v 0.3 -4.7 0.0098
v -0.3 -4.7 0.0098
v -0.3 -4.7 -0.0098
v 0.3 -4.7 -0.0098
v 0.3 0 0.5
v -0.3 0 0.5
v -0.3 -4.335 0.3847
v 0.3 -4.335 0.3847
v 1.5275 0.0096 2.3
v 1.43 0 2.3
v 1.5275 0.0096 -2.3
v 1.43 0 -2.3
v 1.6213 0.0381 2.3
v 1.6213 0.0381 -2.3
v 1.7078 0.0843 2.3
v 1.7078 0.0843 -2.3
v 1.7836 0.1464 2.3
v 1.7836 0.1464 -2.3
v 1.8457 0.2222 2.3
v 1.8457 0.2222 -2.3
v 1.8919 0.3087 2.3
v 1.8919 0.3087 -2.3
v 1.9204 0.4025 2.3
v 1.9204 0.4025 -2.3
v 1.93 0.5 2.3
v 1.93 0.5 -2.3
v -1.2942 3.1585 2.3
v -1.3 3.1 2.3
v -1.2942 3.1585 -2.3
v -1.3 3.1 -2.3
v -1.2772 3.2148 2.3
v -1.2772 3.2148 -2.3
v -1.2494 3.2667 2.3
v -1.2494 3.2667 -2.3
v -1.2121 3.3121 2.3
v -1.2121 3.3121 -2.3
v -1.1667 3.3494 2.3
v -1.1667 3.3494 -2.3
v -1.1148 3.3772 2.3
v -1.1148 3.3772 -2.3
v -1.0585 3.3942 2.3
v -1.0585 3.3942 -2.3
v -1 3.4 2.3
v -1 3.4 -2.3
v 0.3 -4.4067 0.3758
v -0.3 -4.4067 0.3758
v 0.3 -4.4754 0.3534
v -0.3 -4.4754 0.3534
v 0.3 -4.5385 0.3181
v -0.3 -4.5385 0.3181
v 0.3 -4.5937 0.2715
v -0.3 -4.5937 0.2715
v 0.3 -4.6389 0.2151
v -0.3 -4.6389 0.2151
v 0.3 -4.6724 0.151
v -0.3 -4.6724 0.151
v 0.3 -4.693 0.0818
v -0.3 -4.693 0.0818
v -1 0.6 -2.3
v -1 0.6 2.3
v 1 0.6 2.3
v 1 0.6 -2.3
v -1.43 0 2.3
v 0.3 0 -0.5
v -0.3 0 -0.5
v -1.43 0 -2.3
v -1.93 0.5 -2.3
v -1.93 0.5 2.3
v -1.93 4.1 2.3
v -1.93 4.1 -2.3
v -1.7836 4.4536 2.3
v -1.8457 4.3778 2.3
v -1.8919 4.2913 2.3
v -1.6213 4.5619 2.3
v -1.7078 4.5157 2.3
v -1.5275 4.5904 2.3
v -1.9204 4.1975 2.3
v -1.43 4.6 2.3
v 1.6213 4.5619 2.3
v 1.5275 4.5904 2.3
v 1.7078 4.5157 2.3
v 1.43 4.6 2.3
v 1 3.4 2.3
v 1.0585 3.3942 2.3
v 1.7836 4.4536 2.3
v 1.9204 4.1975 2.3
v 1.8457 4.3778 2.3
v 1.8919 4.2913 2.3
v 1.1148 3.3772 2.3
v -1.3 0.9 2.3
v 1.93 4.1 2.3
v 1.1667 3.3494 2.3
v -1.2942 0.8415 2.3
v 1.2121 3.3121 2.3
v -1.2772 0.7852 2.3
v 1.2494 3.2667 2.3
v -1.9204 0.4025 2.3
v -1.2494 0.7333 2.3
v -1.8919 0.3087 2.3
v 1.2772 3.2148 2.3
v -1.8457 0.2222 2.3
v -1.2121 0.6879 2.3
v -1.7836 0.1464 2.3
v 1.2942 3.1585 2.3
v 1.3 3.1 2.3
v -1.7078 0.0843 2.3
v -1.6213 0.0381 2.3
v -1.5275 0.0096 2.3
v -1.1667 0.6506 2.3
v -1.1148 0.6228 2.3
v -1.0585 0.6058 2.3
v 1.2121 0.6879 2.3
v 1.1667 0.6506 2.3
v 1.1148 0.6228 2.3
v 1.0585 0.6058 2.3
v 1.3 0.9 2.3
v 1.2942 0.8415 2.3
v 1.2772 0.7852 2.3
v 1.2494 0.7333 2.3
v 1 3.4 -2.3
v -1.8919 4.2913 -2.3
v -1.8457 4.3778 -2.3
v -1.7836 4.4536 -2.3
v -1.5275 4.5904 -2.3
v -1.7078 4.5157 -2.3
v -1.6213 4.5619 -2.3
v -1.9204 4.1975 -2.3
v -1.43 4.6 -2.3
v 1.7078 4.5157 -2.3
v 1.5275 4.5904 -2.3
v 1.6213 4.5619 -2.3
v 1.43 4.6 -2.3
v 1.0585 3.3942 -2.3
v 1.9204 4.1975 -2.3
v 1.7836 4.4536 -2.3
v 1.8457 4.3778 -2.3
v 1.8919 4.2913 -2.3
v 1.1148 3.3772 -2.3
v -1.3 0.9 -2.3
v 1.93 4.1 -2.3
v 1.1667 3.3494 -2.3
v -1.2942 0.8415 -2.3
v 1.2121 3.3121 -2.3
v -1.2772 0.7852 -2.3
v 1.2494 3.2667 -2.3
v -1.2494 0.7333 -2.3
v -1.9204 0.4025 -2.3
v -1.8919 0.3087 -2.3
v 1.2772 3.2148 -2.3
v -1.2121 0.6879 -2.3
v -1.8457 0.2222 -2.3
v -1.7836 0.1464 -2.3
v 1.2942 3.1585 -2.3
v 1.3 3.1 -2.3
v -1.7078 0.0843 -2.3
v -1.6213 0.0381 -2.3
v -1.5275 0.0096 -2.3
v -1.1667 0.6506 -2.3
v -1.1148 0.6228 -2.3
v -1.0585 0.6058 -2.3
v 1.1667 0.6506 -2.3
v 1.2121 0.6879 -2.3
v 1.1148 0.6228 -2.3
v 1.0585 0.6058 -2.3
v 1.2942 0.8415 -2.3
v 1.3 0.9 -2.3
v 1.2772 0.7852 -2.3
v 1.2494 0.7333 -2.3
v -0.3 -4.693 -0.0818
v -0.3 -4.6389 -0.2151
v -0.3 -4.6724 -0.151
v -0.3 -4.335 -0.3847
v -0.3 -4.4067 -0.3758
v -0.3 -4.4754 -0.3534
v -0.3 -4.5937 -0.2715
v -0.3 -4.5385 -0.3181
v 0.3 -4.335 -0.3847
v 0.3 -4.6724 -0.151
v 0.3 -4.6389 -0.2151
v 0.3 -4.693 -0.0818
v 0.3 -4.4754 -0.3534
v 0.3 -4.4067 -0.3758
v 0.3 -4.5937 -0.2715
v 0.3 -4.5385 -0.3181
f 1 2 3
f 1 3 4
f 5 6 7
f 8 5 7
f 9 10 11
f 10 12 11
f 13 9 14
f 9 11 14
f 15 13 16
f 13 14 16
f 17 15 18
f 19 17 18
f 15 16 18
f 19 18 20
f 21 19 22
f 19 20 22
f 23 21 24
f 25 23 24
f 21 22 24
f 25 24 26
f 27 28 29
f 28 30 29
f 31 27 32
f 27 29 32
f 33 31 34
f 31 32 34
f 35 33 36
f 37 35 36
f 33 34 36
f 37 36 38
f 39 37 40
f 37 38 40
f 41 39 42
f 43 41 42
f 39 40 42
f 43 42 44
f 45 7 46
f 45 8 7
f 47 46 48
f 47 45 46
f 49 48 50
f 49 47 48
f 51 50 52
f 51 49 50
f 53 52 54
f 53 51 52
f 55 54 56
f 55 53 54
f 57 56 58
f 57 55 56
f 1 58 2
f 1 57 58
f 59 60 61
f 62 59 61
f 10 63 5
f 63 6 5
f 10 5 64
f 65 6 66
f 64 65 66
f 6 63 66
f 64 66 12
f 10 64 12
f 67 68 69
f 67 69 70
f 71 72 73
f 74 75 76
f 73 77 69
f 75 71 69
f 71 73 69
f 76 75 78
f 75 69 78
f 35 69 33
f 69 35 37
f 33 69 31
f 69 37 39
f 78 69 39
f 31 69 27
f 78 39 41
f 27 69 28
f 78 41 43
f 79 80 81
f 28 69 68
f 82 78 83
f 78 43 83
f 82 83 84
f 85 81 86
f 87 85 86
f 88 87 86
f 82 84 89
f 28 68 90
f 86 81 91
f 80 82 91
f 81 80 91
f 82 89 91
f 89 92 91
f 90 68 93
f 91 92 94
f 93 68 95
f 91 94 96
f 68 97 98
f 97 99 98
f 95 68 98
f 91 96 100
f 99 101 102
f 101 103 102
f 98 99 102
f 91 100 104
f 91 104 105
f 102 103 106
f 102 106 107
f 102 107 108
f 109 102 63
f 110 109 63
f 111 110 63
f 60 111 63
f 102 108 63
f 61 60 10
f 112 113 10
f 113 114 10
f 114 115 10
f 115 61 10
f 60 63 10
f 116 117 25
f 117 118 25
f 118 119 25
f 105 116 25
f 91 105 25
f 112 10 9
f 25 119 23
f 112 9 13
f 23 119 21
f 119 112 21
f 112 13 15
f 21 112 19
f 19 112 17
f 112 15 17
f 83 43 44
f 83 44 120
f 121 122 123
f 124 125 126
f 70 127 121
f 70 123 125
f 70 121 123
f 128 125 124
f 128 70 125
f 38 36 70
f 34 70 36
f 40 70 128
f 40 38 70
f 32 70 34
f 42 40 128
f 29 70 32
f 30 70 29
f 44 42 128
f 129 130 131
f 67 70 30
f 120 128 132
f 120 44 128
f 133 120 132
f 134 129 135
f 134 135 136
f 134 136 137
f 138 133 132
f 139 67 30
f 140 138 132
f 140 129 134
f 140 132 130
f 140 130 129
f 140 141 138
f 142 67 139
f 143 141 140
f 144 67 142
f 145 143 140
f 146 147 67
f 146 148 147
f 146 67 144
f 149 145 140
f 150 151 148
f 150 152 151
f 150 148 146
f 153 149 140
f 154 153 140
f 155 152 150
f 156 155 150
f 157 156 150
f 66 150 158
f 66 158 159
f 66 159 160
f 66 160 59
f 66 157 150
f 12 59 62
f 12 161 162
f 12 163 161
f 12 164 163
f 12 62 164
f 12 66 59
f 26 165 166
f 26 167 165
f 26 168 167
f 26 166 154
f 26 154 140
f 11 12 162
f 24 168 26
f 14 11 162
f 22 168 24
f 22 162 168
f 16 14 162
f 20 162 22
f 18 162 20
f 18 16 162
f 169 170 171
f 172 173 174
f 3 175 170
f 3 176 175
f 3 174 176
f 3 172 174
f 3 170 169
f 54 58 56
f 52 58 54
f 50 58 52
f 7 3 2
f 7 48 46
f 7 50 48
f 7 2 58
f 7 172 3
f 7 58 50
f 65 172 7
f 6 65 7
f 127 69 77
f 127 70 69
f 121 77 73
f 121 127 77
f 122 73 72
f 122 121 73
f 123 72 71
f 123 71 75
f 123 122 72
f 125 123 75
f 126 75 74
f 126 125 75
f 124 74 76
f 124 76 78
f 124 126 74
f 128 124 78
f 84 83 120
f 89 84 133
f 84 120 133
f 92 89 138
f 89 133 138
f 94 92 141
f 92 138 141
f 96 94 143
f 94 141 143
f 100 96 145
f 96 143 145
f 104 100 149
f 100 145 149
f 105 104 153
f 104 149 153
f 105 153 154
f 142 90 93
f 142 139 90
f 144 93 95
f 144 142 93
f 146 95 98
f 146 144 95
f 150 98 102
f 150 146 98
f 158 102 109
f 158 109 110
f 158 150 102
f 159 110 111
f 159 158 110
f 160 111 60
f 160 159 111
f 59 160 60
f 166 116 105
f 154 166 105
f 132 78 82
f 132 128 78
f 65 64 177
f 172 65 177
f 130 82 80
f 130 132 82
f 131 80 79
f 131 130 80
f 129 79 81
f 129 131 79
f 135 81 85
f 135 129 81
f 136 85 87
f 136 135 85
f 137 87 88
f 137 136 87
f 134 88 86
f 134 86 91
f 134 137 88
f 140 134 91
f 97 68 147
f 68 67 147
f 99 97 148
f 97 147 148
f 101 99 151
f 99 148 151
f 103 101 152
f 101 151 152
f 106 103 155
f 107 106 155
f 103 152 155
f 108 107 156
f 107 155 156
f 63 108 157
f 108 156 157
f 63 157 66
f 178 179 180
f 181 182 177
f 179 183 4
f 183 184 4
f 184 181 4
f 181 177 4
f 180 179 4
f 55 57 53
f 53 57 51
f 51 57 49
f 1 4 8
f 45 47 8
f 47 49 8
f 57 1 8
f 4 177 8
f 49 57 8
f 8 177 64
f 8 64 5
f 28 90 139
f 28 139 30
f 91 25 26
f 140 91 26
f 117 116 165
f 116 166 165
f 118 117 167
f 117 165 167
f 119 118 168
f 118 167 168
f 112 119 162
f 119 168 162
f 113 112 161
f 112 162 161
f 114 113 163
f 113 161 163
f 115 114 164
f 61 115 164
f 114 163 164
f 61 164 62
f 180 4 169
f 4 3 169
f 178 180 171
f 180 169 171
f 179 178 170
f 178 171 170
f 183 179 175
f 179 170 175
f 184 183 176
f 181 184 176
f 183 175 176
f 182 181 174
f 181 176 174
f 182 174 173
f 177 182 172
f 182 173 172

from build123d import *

# Parameters (mm, degrees)
SKETCH_1_W          = 3.86
SKETCH_1_H          = 4.6
EXTRUDE_1_DEPTH     = 4.6
SKETCH_2_W          = 2.6
SKETCH_2_H          = 2.8
CUT_EXTRUDE_1_DEPTH = 7.785639248
FILLET_1_R          = 0.5
FILLET_2_R          = 0.3
SKETCH_3_W          = 0.6
SKETCH_3_H          = 1
EXTRUDE_2_DEPTH     = 4.7
CHAMFER_1_SIZE      = 4.7
CHAMFER_1_SIZE_2    = 0.125
FILLET_4_R          = 0.375


with BuildPart() as part:
    # Эскиз1 → Бобышка-Вытянуть1 (new body)
    with BuildSketch(Plane(origin=(0, 0, 0), x_dir=(1, 0, 0), z_dir=(0, 1, 0))):
        Rectangle(SKETCH_1_W, SKETCH_1_H)
    extrude(amount=EXTRUDE_1_DEPTH)

    # Эскиз2 → Вырез-Вытянуть1 (cut, through all)
    with BuildSketch(Plane.XY.offset(2.3)):
        with Locations((0, 2)):
            Rectangle(SKETCH_2_W, SKETCH_2_H)
    extrude(amount=-CUT_EXTRUDE_1_DEPTH, mode=Mode.SUBTRACT)

    # Скругление1
    fillet_1_edges = [part.edges().sort_by_distance(p)[0] for p in [
        (1.93, 4.6, 0),
        (-1.93, 4.6, 0),
        (1.93, 0, 0),
        (-1.93, 0, 0),
    ]]
    fillet(fillet_1_edges, radius=FILLET_1_R)

    # Скругление2
    fillet_2_edges = [part.edges().sort_by_distance(p)[0] for p in [
        (-1.3, 0.6, 0),
        (-1.3, 3.4, 0),
        (1.3, 3.4, 0),
        (1.3, 0.6, 0),
    ]]
    fillet(fillet_2_edges, radius=FILLET_2_R)

    # Эскиз3 → Бобышка-Вытянуть2 (add)
    with BuildSketch(Plane.XZ):
        Rectangle(SKETCH_3_W, SKETCH_3_H)
    extrude(amount=EXTRUDE_2_DEPTH)

    # Фаска1
    # the kernel refuses this chamfer: 4.7, 0.125 mm, written as the material it takes off along each edge
    with BuildSketch(Plane(origin=(-12.519840253, -4.7, 0.5), x_dir=(0, 0.9999994771802269, 0.0010225650458134765), z_dir=(1, 0, 0))) as chamfer_1_piece_1_section:
        Polygon((CHAMFER_1_SIZE * 0.99999947718, -CHAMFER_1_SIZE * 0.00102256504581), (-CHAMFER_1_SIZE_2 * 0.00102256504581, -CHAMFER_1_SIZE_2 * 0.99999947718), (0, 0), align=None)
    chamfer_1_piece_1 = extrude(amount=25.039680507, mode=Mode.PRIVATE)
    chamfer_1_piece_1 = split(chamfer_1_piece_1, bisect_by=Plane(origin=(0, 0, 0.511194246), z_dir=(0, -1, 0)), keep=Keep.TOP, mode=Mode.PRIVATE)
    add(chamfer_1_piece_1, mode=Mode.SUBTRACT)
    with BuildSketch(Plane(origin=(12.519840253, -4.7, -0.5), x_dir=(0, 0.9999994771802269, -0.0010225650458134765), z_dir=(-1, 0, 0))) as chamfer_1_piece_2_section:
        Polygon((CHAMFER_1_SIZE * 0.99999947718, -CHAMFER_1_SIZE * 0.00102256504581), (-CHAMFER_1_SIZE_2 * 0.00102256504581, -CHAMFER_1_SIZE_2 * 0.99999947718), (0, 0), align=None)
    chamfer_1_piece_2 = extrude(amount=25.039680507, mode=Mode.PRIVATE)
    chamfer_1_piece_2 = split(chamfer_1_piece_2, bisect_by=Plane(origin=(0, 0, -0.511194246), z_dir=(0, -1, 0)), keep=Keep.TOP, mode=Mode.PRIVATE)
    add(chamfer_1_piece_2, mode=Mode.SUBTRACT)

    # Скругление4
    fillet_4_edges = [part.edges().sort_by_distance(p)[0] for p in [
        (0, -4.7, -0.375),
        (0, -4.7, 0.375),
    ]]
    fillet(fillet_4_edges, radius=FILLET_4_R)


solid = part.part
